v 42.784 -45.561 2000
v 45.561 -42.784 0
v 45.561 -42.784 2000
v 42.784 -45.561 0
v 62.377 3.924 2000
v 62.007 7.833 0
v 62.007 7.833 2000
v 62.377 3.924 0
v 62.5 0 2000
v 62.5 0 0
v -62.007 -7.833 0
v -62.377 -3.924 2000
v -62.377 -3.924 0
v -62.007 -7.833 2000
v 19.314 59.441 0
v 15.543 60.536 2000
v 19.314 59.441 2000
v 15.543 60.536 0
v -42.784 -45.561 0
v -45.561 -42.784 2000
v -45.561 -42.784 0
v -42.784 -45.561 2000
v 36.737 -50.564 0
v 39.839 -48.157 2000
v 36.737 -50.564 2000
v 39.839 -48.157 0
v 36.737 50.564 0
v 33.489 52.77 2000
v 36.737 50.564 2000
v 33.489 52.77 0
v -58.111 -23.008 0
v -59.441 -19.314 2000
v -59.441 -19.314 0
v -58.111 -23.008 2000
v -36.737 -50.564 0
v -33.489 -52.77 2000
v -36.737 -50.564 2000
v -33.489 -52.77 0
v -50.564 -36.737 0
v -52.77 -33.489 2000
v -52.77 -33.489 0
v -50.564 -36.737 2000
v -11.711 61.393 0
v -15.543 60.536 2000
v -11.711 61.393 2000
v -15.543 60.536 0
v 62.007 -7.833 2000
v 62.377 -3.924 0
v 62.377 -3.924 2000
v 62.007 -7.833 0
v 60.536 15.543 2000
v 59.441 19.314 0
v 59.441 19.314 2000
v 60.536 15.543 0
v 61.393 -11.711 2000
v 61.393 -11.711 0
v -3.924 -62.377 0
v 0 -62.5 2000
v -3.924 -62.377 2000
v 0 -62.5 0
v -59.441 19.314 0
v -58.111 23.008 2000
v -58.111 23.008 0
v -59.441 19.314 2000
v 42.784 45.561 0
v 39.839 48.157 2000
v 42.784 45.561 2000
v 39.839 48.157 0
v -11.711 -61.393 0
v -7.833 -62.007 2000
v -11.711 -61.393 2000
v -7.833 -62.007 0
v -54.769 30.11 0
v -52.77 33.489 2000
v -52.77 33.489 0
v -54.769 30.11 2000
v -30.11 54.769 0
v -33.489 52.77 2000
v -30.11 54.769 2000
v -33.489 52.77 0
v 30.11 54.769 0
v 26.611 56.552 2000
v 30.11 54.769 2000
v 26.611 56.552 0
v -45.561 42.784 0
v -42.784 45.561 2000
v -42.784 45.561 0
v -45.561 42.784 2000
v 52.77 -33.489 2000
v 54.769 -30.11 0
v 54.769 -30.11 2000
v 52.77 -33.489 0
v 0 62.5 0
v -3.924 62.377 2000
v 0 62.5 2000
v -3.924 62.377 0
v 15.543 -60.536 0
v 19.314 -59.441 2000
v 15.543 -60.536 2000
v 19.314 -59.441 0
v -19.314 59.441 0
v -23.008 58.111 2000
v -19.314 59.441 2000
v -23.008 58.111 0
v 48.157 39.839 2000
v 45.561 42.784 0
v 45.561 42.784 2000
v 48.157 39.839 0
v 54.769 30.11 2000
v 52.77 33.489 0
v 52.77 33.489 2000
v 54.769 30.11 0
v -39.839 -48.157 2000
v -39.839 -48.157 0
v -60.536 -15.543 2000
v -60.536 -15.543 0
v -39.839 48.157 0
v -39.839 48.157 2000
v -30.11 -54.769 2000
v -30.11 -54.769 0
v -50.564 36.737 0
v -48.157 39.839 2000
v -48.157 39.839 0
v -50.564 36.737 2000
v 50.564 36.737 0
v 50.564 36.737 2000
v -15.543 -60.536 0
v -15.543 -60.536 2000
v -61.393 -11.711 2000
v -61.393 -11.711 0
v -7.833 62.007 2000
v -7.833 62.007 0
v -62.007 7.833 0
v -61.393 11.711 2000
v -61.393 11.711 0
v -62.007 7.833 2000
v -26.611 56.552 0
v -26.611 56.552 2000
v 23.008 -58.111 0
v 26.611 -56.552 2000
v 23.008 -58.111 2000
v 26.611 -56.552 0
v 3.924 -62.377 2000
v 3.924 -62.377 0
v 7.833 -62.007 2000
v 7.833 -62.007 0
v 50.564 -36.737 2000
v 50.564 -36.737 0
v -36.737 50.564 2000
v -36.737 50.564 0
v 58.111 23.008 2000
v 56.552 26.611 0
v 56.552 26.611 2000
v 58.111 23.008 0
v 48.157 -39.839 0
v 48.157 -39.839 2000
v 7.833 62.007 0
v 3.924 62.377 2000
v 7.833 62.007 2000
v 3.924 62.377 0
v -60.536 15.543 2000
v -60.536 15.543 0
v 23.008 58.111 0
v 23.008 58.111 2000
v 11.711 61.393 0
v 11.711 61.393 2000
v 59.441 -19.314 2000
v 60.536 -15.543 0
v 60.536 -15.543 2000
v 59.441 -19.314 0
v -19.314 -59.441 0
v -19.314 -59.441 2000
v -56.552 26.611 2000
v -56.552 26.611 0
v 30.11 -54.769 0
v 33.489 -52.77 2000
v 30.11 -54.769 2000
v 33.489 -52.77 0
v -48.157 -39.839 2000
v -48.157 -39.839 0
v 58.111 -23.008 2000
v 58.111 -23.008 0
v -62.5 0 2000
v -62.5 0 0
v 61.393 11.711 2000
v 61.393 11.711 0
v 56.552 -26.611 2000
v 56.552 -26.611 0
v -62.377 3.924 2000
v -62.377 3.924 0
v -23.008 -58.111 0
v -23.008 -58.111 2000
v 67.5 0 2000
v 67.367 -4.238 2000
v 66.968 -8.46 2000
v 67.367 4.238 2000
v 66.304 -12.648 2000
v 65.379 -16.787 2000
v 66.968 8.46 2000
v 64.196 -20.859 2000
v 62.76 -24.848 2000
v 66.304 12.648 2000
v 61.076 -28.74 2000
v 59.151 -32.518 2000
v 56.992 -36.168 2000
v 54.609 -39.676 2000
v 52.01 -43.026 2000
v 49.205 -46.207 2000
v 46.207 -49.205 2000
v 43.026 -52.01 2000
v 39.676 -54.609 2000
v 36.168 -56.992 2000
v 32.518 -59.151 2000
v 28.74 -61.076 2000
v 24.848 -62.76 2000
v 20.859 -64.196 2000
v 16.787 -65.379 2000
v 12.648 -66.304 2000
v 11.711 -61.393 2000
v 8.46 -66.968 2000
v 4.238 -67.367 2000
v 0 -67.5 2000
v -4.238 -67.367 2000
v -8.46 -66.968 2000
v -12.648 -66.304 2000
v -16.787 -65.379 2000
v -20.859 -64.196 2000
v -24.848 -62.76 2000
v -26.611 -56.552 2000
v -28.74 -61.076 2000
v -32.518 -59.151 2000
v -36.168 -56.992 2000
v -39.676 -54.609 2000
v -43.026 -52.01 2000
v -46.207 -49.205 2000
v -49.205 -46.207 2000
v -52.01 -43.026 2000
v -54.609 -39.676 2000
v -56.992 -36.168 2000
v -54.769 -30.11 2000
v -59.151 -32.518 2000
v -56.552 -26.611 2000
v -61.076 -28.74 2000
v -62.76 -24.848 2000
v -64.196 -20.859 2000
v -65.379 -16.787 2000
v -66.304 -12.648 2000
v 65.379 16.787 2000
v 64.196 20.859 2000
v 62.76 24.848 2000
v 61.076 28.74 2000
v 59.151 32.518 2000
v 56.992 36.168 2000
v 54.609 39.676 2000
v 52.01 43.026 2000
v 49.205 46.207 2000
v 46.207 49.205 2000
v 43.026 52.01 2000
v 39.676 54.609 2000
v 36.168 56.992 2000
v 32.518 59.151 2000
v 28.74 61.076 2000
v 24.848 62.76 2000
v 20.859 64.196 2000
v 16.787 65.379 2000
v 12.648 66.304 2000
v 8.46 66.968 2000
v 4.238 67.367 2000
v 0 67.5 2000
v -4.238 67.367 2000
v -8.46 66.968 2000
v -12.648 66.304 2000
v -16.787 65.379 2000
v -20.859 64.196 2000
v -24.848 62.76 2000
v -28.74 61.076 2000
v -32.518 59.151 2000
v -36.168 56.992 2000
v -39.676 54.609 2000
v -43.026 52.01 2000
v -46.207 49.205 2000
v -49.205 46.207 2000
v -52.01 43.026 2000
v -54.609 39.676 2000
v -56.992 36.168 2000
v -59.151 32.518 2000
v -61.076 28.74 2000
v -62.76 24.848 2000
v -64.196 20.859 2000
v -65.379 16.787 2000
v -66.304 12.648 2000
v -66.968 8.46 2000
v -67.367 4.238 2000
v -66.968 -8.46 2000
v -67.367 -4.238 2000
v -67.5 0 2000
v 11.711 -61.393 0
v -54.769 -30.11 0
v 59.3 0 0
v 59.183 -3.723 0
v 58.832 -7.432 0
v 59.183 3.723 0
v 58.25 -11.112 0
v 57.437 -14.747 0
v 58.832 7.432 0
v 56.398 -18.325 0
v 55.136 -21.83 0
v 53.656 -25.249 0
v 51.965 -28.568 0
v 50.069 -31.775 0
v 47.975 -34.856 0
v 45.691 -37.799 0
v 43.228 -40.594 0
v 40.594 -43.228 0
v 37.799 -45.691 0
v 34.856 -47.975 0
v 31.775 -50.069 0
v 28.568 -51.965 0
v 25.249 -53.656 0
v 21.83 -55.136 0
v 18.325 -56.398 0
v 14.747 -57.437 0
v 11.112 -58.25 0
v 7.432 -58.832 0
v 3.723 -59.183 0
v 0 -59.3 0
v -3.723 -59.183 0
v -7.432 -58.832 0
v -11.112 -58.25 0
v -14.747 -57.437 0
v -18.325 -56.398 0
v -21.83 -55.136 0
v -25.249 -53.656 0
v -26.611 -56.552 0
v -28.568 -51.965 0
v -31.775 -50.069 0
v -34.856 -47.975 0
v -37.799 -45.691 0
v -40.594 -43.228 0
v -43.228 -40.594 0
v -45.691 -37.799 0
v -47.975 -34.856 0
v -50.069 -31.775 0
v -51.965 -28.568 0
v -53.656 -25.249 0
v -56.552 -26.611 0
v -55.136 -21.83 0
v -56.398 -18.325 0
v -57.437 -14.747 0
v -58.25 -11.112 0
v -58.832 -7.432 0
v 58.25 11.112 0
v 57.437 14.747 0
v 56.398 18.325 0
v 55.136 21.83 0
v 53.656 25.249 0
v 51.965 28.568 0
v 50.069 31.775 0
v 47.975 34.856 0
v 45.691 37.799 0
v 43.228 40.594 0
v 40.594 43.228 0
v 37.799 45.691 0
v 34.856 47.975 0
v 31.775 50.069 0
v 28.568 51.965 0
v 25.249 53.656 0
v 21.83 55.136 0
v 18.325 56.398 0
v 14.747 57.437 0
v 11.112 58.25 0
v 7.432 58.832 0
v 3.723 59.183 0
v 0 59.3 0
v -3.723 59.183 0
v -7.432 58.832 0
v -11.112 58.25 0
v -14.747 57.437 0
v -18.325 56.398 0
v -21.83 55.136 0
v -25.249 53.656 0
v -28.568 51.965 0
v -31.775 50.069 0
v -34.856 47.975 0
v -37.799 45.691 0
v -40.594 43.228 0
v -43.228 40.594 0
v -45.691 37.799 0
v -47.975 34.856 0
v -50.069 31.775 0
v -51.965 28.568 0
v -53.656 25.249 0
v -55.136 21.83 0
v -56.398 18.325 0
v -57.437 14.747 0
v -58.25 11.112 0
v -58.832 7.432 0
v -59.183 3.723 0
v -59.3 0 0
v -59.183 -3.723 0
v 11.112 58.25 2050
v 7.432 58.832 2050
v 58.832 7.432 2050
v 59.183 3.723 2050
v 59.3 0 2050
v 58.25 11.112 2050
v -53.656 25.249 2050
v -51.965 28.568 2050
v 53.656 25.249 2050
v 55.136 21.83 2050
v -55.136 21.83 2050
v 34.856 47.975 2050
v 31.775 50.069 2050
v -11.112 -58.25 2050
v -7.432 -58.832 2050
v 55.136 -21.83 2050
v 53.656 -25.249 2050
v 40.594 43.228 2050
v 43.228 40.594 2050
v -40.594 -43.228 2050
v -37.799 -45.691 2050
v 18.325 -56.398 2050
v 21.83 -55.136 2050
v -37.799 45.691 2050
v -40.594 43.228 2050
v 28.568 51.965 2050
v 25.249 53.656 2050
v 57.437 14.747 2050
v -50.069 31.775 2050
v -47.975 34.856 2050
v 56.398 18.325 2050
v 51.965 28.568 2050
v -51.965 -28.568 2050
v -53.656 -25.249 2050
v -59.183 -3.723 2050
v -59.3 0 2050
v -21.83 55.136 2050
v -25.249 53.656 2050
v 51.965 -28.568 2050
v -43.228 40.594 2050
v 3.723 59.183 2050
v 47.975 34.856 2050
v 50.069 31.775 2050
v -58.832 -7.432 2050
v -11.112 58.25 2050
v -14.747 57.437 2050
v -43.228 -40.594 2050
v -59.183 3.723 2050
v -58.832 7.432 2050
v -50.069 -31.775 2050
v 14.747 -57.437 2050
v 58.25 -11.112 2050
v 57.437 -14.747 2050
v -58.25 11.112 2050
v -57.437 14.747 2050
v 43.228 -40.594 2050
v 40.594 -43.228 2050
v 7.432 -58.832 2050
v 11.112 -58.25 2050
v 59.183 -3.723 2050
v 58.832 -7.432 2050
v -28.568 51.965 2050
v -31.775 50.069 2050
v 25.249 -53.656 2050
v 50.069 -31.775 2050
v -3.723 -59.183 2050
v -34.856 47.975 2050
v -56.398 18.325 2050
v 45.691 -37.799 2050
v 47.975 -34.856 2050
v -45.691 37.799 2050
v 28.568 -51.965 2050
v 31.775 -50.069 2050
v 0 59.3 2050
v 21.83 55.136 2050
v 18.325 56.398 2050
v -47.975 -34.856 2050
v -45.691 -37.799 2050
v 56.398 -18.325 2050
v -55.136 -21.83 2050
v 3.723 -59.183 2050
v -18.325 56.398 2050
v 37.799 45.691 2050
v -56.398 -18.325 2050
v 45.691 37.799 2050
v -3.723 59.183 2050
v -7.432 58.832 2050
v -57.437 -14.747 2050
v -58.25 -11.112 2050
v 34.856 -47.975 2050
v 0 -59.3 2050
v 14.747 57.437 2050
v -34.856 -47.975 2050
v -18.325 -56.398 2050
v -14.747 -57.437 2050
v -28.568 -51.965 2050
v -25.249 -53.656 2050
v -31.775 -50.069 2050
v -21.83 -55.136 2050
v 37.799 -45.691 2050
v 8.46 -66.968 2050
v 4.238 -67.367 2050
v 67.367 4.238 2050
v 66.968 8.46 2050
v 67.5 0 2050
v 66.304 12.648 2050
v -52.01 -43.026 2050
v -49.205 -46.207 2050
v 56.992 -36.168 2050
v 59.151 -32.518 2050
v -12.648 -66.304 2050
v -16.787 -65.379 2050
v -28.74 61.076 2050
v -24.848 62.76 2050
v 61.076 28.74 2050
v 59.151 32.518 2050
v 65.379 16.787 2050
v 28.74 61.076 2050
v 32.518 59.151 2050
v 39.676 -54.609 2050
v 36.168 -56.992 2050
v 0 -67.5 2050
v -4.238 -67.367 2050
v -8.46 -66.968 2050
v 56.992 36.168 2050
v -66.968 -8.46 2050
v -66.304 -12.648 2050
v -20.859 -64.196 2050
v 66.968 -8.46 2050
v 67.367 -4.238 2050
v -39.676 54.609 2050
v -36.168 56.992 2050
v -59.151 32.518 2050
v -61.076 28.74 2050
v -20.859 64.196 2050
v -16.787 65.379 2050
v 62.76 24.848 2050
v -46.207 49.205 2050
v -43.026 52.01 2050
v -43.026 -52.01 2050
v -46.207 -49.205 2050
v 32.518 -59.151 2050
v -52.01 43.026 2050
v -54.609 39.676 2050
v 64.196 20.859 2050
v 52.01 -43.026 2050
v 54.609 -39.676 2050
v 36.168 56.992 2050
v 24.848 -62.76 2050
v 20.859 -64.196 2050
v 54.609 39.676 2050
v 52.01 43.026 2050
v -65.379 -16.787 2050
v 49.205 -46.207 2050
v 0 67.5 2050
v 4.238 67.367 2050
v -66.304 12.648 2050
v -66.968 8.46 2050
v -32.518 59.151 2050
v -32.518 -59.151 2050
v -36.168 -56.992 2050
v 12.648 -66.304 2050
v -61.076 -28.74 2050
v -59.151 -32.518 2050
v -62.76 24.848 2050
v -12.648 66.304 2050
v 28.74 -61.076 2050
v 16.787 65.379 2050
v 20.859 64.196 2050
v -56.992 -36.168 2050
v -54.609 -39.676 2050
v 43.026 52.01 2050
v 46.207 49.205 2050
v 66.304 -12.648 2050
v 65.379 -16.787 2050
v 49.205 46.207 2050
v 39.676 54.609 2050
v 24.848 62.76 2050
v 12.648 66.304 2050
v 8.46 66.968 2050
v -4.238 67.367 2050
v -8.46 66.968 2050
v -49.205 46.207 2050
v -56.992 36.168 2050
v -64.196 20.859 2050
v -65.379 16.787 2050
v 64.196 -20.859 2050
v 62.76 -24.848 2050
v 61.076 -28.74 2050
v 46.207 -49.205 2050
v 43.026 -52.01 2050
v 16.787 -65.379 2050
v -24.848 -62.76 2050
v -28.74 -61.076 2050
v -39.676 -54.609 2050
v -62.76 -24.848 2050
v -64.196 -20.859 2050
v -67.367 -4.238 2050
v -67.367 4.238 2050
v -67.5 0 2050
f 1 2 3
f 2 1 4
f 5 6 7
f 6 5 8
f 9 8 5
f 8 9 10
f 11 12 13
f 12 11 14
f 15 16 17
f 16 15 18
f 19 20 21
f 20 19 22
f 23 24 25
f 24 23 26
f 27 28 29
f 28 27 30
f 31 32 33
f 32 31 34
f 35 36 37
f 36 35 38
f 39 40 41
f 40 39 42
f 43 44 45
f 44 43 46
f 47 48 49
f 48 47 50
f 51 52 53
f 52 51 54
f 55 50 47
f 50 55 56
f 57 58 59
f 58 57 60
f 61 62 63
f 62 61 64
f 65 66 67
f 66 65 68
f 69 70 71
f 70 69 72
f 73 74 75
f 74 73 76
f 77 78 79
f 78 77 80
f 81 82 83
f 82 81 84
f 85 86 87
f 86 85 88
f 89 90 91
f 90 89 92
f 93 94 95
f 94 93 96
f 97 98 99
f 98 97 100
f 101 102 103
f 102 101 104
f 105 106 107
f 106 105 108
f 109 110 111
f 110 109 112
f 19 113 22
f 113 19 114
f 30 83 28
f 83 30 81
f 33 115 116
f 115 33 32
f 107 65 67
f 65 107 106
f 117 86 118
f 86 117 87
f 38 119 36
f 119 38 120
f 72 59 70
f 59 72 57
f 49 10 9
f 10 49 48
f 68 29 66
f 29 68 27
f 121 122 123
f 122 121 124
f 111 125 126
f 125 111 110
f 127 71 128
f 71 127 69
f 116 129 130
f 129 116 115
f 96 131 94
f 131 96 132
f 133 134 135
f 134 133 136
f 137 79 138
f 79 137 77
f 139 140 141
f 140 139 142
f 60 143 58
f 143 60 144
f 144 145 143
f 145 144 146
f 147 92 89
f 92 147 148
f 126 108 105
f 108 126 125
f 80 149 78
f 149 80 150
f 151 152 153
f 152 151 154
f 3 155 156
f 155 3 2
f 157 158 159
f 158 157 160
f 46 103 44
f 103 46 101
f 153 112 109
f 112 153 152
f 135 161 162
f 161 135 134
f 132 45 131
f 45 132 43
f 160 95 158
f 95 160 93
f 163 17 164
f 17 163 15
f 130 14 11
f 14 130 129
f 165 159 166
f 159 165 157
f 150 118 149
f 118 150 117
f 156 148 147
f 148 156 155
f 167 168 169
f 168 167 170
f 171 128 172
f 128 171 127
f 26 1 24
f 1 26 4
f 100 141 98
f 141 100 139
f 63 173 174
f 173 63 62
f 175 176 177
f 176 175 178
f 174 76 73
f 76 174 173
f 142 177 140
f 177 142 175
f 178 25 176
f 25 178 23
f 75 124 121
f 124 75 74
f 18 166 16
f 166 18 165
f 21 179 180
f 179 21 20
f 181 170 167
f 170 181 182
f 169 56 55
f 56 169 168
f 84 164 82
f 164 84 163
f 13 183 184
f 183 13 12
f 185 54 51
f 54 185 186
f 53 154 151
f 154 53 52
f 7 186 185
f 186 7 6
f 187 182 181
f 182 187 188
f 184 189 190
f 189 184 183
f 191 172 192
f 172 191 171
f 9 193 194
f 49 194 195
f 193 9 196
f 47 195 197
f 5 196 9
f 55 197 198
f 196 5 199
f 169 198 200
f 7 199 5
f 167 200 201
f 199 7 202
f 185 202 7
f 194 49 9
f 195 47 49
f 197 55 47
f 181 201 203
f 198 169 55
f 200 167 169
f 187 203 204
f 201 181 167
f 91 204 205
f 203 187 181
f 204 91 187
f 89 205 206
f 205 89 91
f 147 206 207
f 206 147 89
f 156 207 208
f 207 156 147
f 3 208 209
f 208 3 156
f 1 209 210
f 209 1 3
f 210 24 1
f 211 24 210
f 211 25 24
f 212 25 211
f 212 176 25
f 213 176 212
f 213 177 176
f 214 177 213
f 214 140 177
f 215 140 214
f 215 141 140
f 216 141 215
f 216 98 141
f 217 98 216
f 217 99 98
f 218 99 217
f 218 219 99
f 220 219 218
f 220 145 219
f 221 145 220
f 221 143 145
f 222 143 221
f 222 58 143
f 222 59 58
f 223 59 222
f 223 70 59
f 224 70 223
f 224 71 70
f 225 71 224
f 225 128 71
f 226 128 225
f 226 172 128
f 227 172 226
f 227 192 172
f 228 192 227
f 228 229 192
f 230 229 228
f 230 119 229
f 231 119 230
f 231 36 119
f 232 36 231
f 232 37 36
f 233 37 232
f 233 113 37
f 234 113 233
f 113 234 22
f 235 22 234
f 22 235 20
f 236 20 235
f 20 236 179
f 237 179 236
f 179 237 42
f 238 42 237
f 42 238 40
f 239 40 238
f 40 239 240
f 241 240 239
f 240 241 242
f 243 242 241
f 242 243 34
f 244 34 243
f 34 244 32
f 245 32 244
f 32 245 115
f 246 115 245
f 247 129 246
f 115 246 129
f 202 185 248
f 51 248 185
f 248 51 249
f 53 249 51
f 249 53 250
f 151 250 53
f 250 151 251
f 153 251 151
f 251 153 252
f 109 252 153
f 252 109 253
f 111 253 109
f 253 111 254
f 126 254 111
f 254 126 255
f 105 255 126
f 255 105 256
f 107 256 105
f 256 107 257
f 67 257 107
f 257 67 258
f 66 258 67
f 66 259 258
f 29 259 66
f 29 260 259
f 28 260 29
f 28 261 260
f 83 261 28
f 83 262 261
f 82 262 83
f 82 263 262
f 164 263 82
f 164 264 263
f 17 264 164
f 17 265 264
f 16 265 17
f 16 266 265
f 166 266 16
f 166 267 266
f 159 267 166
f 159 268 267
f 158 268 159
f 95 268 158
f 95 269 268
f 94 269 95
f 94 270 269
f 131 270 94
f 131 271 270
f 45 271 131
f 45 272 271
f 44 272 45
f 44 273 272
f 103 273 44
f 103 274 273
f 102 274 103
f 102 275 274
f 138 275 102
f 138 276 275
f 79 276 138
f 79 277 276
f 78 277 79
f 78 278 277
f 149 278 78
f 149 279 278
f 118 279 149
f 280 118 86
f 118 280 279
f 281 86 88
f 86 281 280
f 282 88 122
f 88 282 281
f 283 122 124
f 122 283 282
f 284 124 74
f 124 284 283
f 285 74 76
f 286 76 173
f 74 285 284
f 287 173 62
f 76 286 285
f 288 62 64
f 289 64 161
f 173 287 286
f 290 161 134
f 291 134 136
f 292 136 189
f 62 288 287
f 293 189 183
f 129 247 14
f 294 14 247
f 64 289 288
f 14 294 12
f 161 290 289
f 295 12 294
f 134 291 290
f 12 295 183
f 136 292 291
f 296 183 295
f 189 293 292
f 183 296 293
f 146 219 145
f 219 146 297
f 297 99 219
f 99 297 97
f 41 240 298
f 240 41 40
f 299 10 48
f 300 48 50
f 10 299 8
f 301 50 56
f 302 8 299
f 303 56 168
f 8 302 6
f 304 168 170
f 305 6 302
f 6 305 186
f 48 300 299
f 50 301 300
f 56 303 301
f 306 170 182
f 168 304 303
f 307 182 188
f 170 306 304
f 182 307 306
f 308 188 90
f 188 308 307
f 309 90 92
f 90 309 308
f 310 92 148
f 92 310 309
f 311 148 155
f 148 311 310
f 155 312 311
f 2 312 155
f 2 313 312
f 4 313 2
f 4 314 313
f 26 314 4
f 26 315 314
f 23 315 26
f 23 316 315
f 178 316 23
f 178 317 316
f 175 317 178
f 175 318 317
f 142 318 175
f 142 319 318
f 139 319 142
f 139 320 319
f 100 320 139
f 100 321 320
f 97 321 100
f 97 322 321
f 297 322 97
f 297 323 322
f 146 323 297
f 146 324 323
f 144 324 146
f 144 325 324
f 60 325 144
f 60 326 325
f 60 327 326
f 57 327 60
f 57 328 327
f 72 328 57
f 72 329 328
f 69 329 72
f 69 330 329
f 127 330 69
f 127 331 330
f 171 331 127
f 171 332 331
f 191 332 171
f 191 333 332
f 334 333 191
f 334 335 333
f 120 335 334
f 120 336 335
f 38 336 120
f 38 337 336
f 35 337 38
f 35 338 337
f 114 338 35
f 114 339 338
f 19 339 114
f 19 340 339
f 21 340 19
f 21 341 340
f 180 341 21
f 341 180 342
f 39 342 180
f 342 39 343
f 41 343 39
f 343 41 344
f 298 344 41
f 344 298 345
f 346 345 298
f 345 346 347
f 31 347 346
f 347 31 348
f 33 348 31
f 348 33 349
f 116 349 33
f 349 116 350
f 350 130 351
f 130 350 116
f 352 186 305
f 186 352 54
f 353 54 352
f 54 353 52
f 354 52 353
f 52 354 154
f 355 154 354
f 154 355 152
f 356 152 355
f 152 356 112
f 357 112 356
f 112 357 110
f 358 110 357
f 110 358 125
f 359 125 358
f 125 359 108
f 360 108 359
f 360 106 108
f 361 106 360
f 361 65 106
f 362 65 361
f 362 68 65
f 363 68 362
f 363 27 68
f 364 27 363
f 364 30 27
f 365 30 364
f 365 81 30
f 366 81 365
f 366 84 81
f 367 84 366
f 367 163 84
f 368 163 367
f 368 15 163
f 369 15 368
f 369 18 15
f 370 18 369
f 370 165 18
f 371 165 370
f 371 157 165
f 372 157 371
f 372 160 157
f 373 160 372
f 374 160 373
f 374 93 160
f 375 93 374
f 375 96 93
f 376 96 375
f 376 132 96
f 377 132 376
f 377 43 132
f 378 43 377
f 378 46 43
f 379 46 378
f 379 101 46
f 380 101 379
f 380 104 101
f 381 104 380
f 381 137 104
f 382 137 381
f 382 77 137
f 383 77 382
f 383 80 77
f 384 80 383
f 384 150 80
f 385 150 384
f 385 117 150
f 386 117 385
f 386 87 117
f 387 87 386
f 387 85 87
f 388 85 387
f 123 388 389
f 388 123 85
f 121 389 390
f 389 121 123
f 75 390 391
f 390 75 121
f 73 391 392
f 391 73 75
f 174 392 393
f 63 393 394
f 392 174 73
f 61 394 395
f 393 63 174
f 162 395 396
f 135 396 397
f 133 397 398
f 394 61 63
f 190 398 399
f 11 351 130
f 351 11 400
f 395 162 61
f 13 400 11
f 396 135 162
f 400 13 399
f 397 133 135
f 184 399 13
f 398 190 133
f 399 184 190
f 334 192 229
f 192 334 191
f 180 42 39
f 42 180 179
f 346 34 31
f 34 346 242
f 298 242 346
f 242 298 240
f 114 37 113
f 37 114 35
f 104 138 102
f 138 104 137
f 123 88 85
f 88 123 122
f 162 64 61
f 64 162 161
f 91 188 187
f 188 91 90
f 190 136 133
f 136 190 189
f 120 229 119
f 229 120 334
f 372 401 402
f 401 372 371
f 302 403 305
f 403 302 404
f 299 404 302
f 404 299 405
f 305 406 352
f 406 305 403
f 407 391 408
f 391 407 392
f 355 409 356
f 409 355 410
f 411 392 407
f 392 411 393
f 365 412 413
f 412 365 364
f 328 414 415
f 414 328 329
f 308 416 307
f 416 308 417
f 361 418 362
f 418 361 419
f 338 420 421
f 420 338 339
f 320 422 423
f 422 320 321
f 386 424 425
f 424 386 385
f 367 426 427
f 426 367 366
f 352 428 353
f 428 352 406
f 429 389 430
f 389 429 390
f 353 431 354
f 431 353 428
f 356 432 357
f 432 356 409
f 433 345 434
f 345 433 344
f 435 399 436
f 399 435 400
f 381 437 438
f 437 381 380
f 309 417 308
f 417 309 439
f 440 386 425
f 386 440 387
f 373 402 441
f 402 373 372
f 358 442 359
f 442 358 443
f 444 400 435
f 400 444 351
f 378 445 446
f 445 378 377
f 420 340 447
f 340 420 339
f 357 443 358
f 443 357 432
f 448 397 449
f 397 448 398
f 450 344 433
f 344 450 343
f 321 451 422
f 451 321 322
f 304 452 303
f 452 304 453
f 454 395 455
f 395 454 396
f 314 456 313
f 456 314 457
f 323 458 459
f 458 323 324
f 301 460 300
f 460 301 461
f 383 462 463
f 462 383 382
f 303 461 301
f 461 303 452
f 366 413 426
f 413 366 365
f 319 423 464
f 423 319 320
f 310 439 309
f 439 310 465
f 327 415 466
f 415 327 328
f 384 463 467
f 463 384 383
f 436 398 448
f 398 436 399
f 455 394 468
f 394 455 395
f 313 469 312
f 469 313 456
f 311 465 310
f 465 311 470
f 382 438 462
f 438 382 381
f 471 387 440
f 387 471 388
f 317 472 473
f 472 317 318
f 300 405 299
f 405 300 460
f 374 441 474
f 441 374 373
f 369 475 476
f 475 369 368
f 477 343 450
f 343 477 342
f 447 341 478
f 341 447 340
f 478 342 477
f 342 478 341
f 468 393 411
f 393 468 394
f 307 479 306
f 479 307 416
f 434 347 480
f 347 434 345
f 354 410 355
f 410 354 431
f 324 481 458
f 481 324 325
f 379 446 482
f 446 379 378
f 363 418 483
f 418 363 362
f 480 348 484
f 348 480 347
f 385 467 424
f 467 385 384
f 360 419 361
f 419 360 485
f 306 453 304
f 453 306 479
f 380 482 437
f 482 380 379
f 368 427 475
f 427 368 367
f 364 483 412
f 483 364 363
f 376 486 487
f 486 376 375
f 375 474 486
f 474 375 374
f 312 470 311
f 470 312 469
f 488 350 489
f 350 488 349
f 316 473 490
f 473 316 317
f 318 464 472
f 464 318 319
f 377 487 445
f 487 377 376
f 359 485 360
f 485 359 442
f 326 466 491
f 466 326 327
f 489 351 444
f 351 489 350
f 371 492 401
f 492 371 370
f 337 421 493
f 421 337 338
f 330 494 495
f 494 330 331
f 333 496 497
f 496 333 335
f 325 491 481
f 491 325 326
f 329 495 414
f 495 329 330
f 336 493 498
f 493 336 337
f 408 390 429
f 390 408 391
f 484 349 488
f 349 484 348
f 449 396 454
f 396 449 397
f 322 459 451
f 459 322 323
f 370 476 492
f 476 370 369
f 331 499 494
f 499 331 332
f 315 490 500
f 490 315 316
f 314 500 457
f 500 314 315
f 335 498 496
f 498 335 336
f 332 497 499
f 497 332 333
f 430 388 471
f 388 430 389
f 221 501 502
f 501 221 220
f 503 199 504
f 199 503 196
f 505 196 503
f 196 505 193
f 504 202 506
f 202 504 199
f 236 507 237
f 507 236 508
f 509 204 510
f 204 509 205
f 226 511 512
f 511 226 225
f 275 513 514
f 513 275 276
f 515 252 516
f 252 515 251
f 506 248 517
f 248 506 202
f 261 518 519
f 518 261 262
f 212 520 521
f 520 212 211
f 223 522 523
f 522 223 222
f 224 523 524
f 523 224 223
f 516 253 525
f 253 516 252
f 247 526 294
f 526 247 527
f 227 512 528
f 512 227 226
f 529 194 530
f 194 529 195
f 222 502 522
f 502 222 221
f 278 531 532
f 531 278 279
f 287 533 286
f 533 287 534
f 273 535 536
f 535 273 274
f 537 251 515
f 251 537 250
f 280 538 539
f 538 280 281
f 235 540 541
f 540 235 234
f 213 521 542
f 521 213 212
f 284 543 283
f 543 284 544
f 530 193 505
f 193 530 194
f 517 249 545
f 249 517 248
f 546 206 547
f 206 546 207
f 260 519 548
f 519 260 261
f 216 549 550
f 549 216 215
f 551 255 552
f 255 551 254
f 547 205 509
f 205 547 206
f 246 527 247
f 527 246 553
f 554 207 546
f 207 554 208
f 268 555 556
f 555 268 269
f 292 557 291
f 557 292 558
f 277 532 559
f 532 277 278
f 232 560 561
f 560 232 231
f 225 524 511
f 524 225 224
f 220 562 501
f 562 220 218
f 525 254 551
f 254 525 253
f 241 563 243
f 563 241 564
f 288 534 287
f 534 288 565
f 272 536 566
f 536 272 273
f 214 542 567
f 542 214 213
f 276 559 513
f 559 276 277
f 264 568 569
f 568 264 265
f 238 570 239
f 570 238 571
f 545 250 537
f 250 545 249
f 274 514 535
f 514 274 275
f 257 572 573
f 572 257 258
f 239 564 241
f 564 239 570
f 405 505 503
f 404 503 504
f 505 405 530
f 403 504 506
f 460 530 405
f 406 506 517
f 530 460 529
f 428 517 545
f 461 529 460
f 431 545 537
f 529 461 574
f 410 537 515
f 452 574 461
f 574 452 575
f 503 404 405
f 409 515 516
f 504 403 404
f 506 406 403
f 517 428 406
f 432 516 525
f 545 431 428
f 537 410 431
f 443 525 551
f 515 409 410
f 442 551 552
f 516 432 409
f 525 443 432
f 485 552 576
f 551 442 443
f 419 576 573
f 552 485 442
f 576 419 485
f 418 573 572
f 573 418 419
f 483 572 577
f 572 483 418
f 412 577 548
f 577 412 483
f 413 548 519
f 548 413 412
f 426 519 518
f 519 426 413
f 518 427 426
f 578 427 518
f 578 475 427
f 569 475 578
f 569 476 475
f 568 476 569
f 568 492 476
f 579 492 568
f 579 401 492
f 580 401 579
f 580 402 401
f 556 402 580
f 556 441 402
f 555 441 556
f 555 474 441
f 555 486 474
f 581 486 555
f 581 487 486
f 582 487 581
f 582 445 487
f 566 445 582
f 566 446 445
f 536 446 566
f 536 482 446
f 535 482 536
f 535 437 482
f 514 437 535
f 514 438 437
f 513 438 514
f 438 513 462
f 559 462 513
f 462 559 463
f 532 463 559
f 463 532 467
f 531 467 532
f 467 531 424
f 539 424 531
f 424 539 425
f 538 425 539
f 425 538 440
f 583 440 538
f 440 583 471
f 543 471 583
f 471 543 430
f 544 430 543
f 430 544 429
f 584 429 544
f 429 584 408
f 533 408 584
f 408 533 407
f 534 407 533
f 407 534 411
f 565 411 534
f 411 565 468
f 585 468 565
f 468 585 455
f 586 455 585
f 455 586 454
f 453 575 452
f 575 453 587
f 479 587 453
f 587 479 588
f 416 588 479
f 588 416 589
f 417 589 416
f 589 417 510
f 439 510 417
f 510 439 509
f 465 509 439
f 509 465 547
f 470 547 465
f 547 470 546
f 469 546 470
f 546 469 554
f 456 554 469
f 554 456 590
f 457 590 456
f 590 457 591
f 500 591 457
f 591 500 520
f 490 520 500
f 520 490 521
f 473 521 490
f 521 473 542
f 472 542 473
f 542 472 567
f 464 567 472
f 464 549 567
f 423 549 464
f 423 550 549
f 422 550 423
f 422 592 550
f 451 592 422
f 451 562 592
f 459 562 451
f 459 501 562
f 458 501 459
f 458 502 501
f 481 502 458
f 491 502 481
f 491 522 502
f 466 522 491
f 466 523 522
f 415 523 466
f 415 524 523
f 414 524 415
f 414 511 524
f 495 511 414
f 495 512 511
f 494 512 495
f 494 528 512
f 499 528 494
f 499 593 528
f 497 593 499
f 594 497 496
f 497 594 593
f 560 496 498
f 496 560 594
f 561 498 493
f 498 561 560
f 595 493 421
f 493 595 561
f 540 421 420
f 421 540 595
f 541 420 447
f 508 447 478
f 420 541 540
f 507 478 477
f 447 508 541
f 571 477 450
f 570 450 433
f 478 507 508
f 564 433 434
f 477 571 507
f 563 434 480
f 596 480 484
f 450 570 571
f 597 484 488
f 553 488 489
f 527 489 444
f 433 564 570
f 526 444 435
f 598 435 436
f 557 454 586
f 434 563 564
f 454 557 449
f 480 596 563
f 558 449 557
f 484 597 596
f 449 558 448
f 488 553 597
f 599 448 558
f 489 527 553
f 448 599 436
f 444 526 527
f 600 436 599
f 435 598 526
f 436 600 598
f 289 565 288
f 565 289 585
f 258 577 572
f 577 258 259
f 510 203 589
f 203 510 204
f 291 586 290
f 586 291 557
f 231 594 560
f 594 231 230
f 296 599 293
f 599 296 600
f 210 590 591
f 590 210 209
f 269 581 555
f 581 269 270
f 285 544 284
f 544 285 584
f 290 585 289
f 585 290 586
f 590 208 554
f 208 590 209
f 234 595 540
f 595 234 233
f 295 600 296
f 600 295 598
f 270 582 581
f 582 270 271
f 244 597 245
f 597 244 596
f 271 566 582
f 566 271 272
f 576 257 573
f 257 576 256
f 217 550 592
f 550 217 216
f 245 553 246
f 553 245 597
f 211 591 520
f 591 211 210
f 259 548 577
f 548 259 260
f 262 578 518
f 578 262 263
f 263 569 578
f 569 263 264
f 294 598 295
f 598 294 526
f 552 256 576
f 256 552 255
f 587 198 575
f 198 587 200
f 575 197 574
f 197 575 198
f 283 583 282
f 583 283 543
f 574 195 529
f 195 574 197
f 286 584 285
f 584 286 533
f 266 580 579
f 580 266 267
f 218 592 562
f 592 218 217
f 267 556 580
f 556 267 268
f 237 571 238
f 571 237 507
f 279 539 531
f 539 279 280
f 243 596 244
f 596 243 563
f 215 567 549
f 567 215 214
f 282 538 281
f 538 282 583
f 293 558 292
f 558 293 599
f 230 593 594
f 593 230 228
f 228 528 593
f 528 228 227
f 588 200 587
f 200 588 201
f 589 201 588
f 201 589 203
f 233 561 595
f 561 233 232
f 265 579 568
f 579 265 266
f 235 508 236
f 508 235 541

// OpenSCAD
module ht_pipe_segment(length = 2000, outer_diameter = 125, wall_thickness = 3.2) {
    difference() {
        cylinder(h = length, d = outer_diameter, $fn = 100);
        translate([0, 0, -1])
            cylinder(h = length + 2, d = outer_diameter - 2 * wall_thickness, $fn = 100);
    }
}

module integrated_end_fitting(outer_diameter = 125, wall_thickness = 3.2, fitting_length = 50) {
    difference() {
        cylinder(h = fitting_length, d = outer_diameter + 10, $fn = 100);
        translate([0, 0, -1])
            cylinder(h = fitting_length + 2, d = outer_diameter - 2 * wall_thickness, $fn = 100);
    }
}

module ht_pipe() {
    ht_pipe_segment();
    translate([0, 0, 2000])
        integrated_end_fitting();
}

ht_pipe();
